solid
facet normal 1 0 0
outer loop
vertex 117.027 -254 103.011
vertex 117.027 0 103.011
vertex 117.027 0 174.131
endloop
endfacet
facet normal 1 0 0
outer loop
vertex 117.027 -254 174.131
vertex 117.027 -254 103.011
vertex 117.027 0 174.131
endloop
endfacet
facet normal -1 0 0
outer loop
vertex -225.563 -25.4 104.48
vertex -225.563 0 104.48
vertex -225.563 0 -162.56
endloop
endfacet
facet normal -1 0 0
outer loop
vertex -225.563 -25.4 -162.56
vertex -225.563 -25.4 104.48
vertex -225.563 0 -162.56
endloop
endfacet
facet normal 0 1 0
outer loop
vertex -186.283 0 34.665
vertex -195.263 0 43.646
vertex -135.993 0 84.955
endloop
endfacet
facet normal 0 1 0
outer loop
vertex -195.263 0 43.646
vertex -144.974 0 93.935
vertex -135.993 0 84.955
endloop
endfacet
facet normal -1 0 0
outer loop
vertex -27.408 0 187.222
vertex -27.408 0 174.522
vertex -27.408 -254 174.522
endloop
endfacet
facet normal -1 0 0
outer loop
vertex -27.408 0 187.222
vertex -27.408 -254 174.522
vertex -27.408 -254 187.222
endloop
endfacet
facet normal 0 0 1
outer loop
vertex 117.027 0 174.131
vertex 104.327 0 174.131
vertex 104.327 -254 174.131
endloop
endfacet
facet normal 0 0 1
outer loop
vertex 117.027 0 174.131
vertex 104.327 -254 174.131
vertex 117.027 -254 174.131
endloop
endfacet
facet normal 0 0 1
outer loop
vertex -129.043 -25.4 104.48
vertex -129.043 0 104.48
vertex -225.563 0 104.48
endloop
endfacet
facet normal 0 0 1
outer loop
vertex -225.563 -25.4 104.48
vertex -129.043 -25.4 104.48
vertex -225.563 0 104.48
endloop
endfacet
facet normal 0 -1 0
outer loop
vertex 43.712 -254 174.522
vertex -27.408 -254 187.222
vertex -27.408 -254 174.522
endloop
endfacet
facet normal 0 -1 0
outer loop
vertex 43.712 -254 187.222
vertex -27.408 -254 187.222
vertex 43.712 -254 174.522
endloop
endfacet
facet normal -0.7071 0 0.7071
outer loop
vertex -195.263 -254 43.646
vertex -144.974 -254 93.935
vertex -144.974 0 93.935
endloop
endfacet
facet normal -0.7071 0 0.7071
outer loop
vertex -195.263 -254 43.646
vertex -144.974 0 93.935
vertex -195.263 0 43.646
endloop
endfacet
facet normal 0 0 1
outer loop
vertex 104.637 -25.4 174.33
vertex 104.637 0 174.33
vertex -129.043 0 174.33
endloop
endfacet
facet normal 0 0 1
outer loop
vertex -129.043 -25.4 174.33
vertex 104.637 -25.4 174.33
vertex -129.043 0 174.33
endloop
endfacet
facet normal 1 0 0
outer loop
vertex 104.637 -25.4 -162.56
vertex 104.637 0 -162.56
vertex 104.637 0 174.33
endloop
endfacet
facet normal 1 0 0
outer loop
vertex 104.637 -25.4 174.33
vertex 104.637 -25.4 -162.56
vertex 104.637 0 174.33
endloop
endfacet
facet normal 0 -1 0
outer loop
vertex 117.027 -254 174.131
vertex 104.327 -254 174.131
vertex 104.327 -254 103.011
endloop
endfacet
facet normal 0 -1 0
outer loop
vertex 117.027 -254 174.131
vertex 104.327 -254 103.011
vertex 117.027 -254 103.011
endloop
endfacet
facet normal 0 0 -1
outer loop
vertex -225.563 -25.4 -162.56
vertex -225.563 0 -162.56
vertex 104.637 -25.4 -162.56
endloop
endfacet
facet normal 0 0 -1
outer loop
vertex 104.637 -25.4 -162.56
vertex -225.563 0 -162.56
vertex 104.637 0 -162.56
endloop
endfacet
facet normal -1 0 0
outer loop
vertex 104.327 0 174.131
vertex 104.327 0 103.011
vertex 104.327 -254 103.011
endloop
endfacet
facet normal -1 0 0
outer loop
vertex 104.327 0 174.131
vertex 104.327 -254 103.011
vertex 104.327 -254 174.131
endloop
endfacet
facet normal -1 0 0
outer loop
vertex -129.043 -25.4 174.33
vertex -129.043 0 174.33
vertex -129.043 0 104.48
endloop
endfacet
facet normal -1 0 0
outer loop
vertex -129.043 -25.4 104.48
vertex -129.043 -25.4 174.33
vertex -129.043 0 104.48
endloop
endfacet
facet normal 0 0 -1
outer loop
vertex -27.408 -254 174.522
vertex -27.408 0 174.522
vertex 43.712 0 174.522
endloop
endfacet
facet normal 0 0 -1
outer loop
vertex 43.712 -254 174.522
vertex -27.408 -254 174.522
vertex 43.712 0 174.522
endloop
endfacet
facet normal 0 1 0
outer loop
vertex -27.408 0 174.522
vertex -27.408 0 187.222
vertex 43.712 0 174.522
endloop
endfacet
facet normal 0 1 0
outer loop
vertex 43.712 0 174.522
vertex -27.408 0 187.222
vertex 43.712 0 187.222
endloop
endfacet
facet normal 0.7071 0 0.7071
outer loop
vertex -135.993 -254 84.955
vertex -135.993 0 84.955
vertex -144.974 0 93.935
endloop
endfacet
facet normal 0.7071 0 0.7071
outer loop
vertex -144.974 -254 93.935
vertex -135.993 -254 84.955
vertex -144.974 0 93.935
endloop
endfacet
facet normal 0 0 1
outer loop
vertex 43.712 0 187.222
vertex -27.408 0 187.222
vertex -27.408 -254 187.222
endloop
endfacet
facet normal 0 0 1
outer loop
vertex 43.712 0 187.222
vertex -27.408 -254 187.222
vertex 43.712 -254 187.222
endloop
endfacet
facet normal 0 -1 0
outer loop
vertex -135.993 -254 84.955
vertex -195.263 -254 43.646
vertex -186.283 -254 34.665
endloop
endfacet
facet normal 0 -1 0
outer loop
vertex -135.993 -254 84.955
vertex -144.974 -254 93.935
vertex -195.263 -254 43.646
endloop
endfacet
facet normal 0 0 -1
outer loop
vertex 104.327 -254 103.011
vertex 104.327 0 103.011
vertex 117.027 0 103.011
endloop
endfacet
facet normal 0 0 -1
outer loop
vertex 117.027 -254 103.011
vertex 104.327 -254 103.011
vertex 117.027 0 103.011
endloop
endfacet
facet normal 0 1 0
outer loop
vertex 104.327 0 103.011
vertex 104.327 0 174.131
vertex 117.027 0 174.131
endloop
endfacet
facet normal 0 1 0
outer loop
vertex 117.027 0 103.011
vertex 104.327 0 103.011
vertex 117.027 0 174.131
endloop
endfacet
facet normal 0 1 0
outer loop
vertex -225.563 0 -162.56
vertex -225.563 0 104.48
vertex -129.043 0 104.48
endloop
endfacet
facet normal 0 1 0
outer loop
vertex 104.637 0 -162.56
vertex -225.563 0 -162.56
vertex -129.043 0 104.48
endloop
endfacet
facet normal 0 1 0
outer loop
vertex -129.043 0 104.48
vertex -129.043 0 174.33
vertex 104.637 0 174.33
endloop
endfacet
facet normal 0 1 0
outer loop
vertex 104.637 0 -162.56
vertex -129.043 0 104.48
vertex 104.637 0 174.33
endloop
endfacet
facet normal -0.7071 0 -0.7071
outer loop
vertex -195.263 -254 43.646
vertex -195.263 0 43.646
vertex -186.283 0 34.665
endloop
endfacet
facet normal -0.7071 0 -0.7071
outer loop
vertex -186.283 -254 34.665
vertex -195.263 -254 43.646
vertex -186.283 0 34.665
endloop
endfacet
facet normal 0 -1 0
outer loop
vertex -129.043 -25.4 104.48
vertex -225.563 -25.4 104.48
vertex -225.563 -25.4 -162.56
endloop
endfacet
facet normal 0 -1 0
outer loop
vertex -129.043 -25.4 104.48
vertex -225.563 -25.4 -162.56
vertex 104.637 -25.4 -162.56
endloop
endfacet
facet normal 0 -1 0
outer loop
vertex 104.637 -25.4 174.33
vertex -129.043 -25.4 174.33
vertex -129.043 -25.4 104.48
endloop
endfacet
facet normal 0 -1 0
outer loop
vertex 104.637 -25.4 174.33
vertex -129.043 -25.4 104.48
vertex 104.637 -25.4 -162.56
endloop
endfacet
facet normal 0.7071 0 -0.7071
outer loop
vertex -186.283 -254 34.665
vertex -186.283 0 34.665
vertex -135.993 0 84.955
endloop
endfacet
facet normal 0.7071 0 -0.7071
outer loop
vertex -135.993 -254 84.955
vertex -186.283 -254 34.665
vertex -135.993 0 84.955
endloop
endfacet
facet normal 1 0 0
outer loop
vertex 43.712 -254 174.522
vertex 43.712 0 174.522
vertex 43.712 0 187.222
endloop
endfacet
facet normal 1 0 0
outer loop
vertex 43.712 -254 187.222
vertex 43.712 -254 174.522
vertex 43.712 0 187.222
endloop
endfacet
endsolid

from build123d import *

# Parameters (mm, degrees)
F1_DEPTH = 25.4
F2_W     = 71.12
F2_H     = 12.7
F2_W_2   = 12.7
F2_H_2   = 71.12
F3_DEPTH = 254
F5_DEPTH = 25.4


with BuildPart() as f1:
    # F0 (on Front) → F1 (new body)
    with BuildSketch(Plane.XZ):
        Polygon((104.636542, -162.56), (104.636542, 101.6), (104.636542, 174.330176), (43.676542, 174.330176), (-27.443458, 174.330176), (-129.043458, 174.330176), (-129.043458, 104.480176), (-225.563458, 0), (-225.563458, -162.56), align=None)
        Polygon((-225.563458, 104.480176), (-225.563458, 0), (-129.043458, 104.480176), align=None)
    extrude(amount=F1_DEPTH)

    # F4 (on Front) → F5 (join)
    with BuildSketch(Plane.XZ):
        Polygon((-223.457229, 14.464707), (-217.975392, 9.171896), (-200.332686, 27.444688), (-205.814524, 32.7375), align=None)
    extrude(amount=F5_DEPTH)


with BuildPart() as f3:
    # F2 (on Front) → F3 (new body)
    with BuildSketch(Plane.XZ):
        with Locations((8.151879, 180.87158)):
            Rectangle(F2_W, F2_H)
        with Locations((110.676953, 138.570622)):
            Rectangle(F2_W_2, F2_H_2)
        Polygon((-195.263058, 43.645673), (-186.282802, 34.665416), (-135.993367, 84.954851), (-144.973624, 93.935107), align=None)
    extrude(amount=F3_DEPTH)


solid = Compound([f1.part, f3.part])
